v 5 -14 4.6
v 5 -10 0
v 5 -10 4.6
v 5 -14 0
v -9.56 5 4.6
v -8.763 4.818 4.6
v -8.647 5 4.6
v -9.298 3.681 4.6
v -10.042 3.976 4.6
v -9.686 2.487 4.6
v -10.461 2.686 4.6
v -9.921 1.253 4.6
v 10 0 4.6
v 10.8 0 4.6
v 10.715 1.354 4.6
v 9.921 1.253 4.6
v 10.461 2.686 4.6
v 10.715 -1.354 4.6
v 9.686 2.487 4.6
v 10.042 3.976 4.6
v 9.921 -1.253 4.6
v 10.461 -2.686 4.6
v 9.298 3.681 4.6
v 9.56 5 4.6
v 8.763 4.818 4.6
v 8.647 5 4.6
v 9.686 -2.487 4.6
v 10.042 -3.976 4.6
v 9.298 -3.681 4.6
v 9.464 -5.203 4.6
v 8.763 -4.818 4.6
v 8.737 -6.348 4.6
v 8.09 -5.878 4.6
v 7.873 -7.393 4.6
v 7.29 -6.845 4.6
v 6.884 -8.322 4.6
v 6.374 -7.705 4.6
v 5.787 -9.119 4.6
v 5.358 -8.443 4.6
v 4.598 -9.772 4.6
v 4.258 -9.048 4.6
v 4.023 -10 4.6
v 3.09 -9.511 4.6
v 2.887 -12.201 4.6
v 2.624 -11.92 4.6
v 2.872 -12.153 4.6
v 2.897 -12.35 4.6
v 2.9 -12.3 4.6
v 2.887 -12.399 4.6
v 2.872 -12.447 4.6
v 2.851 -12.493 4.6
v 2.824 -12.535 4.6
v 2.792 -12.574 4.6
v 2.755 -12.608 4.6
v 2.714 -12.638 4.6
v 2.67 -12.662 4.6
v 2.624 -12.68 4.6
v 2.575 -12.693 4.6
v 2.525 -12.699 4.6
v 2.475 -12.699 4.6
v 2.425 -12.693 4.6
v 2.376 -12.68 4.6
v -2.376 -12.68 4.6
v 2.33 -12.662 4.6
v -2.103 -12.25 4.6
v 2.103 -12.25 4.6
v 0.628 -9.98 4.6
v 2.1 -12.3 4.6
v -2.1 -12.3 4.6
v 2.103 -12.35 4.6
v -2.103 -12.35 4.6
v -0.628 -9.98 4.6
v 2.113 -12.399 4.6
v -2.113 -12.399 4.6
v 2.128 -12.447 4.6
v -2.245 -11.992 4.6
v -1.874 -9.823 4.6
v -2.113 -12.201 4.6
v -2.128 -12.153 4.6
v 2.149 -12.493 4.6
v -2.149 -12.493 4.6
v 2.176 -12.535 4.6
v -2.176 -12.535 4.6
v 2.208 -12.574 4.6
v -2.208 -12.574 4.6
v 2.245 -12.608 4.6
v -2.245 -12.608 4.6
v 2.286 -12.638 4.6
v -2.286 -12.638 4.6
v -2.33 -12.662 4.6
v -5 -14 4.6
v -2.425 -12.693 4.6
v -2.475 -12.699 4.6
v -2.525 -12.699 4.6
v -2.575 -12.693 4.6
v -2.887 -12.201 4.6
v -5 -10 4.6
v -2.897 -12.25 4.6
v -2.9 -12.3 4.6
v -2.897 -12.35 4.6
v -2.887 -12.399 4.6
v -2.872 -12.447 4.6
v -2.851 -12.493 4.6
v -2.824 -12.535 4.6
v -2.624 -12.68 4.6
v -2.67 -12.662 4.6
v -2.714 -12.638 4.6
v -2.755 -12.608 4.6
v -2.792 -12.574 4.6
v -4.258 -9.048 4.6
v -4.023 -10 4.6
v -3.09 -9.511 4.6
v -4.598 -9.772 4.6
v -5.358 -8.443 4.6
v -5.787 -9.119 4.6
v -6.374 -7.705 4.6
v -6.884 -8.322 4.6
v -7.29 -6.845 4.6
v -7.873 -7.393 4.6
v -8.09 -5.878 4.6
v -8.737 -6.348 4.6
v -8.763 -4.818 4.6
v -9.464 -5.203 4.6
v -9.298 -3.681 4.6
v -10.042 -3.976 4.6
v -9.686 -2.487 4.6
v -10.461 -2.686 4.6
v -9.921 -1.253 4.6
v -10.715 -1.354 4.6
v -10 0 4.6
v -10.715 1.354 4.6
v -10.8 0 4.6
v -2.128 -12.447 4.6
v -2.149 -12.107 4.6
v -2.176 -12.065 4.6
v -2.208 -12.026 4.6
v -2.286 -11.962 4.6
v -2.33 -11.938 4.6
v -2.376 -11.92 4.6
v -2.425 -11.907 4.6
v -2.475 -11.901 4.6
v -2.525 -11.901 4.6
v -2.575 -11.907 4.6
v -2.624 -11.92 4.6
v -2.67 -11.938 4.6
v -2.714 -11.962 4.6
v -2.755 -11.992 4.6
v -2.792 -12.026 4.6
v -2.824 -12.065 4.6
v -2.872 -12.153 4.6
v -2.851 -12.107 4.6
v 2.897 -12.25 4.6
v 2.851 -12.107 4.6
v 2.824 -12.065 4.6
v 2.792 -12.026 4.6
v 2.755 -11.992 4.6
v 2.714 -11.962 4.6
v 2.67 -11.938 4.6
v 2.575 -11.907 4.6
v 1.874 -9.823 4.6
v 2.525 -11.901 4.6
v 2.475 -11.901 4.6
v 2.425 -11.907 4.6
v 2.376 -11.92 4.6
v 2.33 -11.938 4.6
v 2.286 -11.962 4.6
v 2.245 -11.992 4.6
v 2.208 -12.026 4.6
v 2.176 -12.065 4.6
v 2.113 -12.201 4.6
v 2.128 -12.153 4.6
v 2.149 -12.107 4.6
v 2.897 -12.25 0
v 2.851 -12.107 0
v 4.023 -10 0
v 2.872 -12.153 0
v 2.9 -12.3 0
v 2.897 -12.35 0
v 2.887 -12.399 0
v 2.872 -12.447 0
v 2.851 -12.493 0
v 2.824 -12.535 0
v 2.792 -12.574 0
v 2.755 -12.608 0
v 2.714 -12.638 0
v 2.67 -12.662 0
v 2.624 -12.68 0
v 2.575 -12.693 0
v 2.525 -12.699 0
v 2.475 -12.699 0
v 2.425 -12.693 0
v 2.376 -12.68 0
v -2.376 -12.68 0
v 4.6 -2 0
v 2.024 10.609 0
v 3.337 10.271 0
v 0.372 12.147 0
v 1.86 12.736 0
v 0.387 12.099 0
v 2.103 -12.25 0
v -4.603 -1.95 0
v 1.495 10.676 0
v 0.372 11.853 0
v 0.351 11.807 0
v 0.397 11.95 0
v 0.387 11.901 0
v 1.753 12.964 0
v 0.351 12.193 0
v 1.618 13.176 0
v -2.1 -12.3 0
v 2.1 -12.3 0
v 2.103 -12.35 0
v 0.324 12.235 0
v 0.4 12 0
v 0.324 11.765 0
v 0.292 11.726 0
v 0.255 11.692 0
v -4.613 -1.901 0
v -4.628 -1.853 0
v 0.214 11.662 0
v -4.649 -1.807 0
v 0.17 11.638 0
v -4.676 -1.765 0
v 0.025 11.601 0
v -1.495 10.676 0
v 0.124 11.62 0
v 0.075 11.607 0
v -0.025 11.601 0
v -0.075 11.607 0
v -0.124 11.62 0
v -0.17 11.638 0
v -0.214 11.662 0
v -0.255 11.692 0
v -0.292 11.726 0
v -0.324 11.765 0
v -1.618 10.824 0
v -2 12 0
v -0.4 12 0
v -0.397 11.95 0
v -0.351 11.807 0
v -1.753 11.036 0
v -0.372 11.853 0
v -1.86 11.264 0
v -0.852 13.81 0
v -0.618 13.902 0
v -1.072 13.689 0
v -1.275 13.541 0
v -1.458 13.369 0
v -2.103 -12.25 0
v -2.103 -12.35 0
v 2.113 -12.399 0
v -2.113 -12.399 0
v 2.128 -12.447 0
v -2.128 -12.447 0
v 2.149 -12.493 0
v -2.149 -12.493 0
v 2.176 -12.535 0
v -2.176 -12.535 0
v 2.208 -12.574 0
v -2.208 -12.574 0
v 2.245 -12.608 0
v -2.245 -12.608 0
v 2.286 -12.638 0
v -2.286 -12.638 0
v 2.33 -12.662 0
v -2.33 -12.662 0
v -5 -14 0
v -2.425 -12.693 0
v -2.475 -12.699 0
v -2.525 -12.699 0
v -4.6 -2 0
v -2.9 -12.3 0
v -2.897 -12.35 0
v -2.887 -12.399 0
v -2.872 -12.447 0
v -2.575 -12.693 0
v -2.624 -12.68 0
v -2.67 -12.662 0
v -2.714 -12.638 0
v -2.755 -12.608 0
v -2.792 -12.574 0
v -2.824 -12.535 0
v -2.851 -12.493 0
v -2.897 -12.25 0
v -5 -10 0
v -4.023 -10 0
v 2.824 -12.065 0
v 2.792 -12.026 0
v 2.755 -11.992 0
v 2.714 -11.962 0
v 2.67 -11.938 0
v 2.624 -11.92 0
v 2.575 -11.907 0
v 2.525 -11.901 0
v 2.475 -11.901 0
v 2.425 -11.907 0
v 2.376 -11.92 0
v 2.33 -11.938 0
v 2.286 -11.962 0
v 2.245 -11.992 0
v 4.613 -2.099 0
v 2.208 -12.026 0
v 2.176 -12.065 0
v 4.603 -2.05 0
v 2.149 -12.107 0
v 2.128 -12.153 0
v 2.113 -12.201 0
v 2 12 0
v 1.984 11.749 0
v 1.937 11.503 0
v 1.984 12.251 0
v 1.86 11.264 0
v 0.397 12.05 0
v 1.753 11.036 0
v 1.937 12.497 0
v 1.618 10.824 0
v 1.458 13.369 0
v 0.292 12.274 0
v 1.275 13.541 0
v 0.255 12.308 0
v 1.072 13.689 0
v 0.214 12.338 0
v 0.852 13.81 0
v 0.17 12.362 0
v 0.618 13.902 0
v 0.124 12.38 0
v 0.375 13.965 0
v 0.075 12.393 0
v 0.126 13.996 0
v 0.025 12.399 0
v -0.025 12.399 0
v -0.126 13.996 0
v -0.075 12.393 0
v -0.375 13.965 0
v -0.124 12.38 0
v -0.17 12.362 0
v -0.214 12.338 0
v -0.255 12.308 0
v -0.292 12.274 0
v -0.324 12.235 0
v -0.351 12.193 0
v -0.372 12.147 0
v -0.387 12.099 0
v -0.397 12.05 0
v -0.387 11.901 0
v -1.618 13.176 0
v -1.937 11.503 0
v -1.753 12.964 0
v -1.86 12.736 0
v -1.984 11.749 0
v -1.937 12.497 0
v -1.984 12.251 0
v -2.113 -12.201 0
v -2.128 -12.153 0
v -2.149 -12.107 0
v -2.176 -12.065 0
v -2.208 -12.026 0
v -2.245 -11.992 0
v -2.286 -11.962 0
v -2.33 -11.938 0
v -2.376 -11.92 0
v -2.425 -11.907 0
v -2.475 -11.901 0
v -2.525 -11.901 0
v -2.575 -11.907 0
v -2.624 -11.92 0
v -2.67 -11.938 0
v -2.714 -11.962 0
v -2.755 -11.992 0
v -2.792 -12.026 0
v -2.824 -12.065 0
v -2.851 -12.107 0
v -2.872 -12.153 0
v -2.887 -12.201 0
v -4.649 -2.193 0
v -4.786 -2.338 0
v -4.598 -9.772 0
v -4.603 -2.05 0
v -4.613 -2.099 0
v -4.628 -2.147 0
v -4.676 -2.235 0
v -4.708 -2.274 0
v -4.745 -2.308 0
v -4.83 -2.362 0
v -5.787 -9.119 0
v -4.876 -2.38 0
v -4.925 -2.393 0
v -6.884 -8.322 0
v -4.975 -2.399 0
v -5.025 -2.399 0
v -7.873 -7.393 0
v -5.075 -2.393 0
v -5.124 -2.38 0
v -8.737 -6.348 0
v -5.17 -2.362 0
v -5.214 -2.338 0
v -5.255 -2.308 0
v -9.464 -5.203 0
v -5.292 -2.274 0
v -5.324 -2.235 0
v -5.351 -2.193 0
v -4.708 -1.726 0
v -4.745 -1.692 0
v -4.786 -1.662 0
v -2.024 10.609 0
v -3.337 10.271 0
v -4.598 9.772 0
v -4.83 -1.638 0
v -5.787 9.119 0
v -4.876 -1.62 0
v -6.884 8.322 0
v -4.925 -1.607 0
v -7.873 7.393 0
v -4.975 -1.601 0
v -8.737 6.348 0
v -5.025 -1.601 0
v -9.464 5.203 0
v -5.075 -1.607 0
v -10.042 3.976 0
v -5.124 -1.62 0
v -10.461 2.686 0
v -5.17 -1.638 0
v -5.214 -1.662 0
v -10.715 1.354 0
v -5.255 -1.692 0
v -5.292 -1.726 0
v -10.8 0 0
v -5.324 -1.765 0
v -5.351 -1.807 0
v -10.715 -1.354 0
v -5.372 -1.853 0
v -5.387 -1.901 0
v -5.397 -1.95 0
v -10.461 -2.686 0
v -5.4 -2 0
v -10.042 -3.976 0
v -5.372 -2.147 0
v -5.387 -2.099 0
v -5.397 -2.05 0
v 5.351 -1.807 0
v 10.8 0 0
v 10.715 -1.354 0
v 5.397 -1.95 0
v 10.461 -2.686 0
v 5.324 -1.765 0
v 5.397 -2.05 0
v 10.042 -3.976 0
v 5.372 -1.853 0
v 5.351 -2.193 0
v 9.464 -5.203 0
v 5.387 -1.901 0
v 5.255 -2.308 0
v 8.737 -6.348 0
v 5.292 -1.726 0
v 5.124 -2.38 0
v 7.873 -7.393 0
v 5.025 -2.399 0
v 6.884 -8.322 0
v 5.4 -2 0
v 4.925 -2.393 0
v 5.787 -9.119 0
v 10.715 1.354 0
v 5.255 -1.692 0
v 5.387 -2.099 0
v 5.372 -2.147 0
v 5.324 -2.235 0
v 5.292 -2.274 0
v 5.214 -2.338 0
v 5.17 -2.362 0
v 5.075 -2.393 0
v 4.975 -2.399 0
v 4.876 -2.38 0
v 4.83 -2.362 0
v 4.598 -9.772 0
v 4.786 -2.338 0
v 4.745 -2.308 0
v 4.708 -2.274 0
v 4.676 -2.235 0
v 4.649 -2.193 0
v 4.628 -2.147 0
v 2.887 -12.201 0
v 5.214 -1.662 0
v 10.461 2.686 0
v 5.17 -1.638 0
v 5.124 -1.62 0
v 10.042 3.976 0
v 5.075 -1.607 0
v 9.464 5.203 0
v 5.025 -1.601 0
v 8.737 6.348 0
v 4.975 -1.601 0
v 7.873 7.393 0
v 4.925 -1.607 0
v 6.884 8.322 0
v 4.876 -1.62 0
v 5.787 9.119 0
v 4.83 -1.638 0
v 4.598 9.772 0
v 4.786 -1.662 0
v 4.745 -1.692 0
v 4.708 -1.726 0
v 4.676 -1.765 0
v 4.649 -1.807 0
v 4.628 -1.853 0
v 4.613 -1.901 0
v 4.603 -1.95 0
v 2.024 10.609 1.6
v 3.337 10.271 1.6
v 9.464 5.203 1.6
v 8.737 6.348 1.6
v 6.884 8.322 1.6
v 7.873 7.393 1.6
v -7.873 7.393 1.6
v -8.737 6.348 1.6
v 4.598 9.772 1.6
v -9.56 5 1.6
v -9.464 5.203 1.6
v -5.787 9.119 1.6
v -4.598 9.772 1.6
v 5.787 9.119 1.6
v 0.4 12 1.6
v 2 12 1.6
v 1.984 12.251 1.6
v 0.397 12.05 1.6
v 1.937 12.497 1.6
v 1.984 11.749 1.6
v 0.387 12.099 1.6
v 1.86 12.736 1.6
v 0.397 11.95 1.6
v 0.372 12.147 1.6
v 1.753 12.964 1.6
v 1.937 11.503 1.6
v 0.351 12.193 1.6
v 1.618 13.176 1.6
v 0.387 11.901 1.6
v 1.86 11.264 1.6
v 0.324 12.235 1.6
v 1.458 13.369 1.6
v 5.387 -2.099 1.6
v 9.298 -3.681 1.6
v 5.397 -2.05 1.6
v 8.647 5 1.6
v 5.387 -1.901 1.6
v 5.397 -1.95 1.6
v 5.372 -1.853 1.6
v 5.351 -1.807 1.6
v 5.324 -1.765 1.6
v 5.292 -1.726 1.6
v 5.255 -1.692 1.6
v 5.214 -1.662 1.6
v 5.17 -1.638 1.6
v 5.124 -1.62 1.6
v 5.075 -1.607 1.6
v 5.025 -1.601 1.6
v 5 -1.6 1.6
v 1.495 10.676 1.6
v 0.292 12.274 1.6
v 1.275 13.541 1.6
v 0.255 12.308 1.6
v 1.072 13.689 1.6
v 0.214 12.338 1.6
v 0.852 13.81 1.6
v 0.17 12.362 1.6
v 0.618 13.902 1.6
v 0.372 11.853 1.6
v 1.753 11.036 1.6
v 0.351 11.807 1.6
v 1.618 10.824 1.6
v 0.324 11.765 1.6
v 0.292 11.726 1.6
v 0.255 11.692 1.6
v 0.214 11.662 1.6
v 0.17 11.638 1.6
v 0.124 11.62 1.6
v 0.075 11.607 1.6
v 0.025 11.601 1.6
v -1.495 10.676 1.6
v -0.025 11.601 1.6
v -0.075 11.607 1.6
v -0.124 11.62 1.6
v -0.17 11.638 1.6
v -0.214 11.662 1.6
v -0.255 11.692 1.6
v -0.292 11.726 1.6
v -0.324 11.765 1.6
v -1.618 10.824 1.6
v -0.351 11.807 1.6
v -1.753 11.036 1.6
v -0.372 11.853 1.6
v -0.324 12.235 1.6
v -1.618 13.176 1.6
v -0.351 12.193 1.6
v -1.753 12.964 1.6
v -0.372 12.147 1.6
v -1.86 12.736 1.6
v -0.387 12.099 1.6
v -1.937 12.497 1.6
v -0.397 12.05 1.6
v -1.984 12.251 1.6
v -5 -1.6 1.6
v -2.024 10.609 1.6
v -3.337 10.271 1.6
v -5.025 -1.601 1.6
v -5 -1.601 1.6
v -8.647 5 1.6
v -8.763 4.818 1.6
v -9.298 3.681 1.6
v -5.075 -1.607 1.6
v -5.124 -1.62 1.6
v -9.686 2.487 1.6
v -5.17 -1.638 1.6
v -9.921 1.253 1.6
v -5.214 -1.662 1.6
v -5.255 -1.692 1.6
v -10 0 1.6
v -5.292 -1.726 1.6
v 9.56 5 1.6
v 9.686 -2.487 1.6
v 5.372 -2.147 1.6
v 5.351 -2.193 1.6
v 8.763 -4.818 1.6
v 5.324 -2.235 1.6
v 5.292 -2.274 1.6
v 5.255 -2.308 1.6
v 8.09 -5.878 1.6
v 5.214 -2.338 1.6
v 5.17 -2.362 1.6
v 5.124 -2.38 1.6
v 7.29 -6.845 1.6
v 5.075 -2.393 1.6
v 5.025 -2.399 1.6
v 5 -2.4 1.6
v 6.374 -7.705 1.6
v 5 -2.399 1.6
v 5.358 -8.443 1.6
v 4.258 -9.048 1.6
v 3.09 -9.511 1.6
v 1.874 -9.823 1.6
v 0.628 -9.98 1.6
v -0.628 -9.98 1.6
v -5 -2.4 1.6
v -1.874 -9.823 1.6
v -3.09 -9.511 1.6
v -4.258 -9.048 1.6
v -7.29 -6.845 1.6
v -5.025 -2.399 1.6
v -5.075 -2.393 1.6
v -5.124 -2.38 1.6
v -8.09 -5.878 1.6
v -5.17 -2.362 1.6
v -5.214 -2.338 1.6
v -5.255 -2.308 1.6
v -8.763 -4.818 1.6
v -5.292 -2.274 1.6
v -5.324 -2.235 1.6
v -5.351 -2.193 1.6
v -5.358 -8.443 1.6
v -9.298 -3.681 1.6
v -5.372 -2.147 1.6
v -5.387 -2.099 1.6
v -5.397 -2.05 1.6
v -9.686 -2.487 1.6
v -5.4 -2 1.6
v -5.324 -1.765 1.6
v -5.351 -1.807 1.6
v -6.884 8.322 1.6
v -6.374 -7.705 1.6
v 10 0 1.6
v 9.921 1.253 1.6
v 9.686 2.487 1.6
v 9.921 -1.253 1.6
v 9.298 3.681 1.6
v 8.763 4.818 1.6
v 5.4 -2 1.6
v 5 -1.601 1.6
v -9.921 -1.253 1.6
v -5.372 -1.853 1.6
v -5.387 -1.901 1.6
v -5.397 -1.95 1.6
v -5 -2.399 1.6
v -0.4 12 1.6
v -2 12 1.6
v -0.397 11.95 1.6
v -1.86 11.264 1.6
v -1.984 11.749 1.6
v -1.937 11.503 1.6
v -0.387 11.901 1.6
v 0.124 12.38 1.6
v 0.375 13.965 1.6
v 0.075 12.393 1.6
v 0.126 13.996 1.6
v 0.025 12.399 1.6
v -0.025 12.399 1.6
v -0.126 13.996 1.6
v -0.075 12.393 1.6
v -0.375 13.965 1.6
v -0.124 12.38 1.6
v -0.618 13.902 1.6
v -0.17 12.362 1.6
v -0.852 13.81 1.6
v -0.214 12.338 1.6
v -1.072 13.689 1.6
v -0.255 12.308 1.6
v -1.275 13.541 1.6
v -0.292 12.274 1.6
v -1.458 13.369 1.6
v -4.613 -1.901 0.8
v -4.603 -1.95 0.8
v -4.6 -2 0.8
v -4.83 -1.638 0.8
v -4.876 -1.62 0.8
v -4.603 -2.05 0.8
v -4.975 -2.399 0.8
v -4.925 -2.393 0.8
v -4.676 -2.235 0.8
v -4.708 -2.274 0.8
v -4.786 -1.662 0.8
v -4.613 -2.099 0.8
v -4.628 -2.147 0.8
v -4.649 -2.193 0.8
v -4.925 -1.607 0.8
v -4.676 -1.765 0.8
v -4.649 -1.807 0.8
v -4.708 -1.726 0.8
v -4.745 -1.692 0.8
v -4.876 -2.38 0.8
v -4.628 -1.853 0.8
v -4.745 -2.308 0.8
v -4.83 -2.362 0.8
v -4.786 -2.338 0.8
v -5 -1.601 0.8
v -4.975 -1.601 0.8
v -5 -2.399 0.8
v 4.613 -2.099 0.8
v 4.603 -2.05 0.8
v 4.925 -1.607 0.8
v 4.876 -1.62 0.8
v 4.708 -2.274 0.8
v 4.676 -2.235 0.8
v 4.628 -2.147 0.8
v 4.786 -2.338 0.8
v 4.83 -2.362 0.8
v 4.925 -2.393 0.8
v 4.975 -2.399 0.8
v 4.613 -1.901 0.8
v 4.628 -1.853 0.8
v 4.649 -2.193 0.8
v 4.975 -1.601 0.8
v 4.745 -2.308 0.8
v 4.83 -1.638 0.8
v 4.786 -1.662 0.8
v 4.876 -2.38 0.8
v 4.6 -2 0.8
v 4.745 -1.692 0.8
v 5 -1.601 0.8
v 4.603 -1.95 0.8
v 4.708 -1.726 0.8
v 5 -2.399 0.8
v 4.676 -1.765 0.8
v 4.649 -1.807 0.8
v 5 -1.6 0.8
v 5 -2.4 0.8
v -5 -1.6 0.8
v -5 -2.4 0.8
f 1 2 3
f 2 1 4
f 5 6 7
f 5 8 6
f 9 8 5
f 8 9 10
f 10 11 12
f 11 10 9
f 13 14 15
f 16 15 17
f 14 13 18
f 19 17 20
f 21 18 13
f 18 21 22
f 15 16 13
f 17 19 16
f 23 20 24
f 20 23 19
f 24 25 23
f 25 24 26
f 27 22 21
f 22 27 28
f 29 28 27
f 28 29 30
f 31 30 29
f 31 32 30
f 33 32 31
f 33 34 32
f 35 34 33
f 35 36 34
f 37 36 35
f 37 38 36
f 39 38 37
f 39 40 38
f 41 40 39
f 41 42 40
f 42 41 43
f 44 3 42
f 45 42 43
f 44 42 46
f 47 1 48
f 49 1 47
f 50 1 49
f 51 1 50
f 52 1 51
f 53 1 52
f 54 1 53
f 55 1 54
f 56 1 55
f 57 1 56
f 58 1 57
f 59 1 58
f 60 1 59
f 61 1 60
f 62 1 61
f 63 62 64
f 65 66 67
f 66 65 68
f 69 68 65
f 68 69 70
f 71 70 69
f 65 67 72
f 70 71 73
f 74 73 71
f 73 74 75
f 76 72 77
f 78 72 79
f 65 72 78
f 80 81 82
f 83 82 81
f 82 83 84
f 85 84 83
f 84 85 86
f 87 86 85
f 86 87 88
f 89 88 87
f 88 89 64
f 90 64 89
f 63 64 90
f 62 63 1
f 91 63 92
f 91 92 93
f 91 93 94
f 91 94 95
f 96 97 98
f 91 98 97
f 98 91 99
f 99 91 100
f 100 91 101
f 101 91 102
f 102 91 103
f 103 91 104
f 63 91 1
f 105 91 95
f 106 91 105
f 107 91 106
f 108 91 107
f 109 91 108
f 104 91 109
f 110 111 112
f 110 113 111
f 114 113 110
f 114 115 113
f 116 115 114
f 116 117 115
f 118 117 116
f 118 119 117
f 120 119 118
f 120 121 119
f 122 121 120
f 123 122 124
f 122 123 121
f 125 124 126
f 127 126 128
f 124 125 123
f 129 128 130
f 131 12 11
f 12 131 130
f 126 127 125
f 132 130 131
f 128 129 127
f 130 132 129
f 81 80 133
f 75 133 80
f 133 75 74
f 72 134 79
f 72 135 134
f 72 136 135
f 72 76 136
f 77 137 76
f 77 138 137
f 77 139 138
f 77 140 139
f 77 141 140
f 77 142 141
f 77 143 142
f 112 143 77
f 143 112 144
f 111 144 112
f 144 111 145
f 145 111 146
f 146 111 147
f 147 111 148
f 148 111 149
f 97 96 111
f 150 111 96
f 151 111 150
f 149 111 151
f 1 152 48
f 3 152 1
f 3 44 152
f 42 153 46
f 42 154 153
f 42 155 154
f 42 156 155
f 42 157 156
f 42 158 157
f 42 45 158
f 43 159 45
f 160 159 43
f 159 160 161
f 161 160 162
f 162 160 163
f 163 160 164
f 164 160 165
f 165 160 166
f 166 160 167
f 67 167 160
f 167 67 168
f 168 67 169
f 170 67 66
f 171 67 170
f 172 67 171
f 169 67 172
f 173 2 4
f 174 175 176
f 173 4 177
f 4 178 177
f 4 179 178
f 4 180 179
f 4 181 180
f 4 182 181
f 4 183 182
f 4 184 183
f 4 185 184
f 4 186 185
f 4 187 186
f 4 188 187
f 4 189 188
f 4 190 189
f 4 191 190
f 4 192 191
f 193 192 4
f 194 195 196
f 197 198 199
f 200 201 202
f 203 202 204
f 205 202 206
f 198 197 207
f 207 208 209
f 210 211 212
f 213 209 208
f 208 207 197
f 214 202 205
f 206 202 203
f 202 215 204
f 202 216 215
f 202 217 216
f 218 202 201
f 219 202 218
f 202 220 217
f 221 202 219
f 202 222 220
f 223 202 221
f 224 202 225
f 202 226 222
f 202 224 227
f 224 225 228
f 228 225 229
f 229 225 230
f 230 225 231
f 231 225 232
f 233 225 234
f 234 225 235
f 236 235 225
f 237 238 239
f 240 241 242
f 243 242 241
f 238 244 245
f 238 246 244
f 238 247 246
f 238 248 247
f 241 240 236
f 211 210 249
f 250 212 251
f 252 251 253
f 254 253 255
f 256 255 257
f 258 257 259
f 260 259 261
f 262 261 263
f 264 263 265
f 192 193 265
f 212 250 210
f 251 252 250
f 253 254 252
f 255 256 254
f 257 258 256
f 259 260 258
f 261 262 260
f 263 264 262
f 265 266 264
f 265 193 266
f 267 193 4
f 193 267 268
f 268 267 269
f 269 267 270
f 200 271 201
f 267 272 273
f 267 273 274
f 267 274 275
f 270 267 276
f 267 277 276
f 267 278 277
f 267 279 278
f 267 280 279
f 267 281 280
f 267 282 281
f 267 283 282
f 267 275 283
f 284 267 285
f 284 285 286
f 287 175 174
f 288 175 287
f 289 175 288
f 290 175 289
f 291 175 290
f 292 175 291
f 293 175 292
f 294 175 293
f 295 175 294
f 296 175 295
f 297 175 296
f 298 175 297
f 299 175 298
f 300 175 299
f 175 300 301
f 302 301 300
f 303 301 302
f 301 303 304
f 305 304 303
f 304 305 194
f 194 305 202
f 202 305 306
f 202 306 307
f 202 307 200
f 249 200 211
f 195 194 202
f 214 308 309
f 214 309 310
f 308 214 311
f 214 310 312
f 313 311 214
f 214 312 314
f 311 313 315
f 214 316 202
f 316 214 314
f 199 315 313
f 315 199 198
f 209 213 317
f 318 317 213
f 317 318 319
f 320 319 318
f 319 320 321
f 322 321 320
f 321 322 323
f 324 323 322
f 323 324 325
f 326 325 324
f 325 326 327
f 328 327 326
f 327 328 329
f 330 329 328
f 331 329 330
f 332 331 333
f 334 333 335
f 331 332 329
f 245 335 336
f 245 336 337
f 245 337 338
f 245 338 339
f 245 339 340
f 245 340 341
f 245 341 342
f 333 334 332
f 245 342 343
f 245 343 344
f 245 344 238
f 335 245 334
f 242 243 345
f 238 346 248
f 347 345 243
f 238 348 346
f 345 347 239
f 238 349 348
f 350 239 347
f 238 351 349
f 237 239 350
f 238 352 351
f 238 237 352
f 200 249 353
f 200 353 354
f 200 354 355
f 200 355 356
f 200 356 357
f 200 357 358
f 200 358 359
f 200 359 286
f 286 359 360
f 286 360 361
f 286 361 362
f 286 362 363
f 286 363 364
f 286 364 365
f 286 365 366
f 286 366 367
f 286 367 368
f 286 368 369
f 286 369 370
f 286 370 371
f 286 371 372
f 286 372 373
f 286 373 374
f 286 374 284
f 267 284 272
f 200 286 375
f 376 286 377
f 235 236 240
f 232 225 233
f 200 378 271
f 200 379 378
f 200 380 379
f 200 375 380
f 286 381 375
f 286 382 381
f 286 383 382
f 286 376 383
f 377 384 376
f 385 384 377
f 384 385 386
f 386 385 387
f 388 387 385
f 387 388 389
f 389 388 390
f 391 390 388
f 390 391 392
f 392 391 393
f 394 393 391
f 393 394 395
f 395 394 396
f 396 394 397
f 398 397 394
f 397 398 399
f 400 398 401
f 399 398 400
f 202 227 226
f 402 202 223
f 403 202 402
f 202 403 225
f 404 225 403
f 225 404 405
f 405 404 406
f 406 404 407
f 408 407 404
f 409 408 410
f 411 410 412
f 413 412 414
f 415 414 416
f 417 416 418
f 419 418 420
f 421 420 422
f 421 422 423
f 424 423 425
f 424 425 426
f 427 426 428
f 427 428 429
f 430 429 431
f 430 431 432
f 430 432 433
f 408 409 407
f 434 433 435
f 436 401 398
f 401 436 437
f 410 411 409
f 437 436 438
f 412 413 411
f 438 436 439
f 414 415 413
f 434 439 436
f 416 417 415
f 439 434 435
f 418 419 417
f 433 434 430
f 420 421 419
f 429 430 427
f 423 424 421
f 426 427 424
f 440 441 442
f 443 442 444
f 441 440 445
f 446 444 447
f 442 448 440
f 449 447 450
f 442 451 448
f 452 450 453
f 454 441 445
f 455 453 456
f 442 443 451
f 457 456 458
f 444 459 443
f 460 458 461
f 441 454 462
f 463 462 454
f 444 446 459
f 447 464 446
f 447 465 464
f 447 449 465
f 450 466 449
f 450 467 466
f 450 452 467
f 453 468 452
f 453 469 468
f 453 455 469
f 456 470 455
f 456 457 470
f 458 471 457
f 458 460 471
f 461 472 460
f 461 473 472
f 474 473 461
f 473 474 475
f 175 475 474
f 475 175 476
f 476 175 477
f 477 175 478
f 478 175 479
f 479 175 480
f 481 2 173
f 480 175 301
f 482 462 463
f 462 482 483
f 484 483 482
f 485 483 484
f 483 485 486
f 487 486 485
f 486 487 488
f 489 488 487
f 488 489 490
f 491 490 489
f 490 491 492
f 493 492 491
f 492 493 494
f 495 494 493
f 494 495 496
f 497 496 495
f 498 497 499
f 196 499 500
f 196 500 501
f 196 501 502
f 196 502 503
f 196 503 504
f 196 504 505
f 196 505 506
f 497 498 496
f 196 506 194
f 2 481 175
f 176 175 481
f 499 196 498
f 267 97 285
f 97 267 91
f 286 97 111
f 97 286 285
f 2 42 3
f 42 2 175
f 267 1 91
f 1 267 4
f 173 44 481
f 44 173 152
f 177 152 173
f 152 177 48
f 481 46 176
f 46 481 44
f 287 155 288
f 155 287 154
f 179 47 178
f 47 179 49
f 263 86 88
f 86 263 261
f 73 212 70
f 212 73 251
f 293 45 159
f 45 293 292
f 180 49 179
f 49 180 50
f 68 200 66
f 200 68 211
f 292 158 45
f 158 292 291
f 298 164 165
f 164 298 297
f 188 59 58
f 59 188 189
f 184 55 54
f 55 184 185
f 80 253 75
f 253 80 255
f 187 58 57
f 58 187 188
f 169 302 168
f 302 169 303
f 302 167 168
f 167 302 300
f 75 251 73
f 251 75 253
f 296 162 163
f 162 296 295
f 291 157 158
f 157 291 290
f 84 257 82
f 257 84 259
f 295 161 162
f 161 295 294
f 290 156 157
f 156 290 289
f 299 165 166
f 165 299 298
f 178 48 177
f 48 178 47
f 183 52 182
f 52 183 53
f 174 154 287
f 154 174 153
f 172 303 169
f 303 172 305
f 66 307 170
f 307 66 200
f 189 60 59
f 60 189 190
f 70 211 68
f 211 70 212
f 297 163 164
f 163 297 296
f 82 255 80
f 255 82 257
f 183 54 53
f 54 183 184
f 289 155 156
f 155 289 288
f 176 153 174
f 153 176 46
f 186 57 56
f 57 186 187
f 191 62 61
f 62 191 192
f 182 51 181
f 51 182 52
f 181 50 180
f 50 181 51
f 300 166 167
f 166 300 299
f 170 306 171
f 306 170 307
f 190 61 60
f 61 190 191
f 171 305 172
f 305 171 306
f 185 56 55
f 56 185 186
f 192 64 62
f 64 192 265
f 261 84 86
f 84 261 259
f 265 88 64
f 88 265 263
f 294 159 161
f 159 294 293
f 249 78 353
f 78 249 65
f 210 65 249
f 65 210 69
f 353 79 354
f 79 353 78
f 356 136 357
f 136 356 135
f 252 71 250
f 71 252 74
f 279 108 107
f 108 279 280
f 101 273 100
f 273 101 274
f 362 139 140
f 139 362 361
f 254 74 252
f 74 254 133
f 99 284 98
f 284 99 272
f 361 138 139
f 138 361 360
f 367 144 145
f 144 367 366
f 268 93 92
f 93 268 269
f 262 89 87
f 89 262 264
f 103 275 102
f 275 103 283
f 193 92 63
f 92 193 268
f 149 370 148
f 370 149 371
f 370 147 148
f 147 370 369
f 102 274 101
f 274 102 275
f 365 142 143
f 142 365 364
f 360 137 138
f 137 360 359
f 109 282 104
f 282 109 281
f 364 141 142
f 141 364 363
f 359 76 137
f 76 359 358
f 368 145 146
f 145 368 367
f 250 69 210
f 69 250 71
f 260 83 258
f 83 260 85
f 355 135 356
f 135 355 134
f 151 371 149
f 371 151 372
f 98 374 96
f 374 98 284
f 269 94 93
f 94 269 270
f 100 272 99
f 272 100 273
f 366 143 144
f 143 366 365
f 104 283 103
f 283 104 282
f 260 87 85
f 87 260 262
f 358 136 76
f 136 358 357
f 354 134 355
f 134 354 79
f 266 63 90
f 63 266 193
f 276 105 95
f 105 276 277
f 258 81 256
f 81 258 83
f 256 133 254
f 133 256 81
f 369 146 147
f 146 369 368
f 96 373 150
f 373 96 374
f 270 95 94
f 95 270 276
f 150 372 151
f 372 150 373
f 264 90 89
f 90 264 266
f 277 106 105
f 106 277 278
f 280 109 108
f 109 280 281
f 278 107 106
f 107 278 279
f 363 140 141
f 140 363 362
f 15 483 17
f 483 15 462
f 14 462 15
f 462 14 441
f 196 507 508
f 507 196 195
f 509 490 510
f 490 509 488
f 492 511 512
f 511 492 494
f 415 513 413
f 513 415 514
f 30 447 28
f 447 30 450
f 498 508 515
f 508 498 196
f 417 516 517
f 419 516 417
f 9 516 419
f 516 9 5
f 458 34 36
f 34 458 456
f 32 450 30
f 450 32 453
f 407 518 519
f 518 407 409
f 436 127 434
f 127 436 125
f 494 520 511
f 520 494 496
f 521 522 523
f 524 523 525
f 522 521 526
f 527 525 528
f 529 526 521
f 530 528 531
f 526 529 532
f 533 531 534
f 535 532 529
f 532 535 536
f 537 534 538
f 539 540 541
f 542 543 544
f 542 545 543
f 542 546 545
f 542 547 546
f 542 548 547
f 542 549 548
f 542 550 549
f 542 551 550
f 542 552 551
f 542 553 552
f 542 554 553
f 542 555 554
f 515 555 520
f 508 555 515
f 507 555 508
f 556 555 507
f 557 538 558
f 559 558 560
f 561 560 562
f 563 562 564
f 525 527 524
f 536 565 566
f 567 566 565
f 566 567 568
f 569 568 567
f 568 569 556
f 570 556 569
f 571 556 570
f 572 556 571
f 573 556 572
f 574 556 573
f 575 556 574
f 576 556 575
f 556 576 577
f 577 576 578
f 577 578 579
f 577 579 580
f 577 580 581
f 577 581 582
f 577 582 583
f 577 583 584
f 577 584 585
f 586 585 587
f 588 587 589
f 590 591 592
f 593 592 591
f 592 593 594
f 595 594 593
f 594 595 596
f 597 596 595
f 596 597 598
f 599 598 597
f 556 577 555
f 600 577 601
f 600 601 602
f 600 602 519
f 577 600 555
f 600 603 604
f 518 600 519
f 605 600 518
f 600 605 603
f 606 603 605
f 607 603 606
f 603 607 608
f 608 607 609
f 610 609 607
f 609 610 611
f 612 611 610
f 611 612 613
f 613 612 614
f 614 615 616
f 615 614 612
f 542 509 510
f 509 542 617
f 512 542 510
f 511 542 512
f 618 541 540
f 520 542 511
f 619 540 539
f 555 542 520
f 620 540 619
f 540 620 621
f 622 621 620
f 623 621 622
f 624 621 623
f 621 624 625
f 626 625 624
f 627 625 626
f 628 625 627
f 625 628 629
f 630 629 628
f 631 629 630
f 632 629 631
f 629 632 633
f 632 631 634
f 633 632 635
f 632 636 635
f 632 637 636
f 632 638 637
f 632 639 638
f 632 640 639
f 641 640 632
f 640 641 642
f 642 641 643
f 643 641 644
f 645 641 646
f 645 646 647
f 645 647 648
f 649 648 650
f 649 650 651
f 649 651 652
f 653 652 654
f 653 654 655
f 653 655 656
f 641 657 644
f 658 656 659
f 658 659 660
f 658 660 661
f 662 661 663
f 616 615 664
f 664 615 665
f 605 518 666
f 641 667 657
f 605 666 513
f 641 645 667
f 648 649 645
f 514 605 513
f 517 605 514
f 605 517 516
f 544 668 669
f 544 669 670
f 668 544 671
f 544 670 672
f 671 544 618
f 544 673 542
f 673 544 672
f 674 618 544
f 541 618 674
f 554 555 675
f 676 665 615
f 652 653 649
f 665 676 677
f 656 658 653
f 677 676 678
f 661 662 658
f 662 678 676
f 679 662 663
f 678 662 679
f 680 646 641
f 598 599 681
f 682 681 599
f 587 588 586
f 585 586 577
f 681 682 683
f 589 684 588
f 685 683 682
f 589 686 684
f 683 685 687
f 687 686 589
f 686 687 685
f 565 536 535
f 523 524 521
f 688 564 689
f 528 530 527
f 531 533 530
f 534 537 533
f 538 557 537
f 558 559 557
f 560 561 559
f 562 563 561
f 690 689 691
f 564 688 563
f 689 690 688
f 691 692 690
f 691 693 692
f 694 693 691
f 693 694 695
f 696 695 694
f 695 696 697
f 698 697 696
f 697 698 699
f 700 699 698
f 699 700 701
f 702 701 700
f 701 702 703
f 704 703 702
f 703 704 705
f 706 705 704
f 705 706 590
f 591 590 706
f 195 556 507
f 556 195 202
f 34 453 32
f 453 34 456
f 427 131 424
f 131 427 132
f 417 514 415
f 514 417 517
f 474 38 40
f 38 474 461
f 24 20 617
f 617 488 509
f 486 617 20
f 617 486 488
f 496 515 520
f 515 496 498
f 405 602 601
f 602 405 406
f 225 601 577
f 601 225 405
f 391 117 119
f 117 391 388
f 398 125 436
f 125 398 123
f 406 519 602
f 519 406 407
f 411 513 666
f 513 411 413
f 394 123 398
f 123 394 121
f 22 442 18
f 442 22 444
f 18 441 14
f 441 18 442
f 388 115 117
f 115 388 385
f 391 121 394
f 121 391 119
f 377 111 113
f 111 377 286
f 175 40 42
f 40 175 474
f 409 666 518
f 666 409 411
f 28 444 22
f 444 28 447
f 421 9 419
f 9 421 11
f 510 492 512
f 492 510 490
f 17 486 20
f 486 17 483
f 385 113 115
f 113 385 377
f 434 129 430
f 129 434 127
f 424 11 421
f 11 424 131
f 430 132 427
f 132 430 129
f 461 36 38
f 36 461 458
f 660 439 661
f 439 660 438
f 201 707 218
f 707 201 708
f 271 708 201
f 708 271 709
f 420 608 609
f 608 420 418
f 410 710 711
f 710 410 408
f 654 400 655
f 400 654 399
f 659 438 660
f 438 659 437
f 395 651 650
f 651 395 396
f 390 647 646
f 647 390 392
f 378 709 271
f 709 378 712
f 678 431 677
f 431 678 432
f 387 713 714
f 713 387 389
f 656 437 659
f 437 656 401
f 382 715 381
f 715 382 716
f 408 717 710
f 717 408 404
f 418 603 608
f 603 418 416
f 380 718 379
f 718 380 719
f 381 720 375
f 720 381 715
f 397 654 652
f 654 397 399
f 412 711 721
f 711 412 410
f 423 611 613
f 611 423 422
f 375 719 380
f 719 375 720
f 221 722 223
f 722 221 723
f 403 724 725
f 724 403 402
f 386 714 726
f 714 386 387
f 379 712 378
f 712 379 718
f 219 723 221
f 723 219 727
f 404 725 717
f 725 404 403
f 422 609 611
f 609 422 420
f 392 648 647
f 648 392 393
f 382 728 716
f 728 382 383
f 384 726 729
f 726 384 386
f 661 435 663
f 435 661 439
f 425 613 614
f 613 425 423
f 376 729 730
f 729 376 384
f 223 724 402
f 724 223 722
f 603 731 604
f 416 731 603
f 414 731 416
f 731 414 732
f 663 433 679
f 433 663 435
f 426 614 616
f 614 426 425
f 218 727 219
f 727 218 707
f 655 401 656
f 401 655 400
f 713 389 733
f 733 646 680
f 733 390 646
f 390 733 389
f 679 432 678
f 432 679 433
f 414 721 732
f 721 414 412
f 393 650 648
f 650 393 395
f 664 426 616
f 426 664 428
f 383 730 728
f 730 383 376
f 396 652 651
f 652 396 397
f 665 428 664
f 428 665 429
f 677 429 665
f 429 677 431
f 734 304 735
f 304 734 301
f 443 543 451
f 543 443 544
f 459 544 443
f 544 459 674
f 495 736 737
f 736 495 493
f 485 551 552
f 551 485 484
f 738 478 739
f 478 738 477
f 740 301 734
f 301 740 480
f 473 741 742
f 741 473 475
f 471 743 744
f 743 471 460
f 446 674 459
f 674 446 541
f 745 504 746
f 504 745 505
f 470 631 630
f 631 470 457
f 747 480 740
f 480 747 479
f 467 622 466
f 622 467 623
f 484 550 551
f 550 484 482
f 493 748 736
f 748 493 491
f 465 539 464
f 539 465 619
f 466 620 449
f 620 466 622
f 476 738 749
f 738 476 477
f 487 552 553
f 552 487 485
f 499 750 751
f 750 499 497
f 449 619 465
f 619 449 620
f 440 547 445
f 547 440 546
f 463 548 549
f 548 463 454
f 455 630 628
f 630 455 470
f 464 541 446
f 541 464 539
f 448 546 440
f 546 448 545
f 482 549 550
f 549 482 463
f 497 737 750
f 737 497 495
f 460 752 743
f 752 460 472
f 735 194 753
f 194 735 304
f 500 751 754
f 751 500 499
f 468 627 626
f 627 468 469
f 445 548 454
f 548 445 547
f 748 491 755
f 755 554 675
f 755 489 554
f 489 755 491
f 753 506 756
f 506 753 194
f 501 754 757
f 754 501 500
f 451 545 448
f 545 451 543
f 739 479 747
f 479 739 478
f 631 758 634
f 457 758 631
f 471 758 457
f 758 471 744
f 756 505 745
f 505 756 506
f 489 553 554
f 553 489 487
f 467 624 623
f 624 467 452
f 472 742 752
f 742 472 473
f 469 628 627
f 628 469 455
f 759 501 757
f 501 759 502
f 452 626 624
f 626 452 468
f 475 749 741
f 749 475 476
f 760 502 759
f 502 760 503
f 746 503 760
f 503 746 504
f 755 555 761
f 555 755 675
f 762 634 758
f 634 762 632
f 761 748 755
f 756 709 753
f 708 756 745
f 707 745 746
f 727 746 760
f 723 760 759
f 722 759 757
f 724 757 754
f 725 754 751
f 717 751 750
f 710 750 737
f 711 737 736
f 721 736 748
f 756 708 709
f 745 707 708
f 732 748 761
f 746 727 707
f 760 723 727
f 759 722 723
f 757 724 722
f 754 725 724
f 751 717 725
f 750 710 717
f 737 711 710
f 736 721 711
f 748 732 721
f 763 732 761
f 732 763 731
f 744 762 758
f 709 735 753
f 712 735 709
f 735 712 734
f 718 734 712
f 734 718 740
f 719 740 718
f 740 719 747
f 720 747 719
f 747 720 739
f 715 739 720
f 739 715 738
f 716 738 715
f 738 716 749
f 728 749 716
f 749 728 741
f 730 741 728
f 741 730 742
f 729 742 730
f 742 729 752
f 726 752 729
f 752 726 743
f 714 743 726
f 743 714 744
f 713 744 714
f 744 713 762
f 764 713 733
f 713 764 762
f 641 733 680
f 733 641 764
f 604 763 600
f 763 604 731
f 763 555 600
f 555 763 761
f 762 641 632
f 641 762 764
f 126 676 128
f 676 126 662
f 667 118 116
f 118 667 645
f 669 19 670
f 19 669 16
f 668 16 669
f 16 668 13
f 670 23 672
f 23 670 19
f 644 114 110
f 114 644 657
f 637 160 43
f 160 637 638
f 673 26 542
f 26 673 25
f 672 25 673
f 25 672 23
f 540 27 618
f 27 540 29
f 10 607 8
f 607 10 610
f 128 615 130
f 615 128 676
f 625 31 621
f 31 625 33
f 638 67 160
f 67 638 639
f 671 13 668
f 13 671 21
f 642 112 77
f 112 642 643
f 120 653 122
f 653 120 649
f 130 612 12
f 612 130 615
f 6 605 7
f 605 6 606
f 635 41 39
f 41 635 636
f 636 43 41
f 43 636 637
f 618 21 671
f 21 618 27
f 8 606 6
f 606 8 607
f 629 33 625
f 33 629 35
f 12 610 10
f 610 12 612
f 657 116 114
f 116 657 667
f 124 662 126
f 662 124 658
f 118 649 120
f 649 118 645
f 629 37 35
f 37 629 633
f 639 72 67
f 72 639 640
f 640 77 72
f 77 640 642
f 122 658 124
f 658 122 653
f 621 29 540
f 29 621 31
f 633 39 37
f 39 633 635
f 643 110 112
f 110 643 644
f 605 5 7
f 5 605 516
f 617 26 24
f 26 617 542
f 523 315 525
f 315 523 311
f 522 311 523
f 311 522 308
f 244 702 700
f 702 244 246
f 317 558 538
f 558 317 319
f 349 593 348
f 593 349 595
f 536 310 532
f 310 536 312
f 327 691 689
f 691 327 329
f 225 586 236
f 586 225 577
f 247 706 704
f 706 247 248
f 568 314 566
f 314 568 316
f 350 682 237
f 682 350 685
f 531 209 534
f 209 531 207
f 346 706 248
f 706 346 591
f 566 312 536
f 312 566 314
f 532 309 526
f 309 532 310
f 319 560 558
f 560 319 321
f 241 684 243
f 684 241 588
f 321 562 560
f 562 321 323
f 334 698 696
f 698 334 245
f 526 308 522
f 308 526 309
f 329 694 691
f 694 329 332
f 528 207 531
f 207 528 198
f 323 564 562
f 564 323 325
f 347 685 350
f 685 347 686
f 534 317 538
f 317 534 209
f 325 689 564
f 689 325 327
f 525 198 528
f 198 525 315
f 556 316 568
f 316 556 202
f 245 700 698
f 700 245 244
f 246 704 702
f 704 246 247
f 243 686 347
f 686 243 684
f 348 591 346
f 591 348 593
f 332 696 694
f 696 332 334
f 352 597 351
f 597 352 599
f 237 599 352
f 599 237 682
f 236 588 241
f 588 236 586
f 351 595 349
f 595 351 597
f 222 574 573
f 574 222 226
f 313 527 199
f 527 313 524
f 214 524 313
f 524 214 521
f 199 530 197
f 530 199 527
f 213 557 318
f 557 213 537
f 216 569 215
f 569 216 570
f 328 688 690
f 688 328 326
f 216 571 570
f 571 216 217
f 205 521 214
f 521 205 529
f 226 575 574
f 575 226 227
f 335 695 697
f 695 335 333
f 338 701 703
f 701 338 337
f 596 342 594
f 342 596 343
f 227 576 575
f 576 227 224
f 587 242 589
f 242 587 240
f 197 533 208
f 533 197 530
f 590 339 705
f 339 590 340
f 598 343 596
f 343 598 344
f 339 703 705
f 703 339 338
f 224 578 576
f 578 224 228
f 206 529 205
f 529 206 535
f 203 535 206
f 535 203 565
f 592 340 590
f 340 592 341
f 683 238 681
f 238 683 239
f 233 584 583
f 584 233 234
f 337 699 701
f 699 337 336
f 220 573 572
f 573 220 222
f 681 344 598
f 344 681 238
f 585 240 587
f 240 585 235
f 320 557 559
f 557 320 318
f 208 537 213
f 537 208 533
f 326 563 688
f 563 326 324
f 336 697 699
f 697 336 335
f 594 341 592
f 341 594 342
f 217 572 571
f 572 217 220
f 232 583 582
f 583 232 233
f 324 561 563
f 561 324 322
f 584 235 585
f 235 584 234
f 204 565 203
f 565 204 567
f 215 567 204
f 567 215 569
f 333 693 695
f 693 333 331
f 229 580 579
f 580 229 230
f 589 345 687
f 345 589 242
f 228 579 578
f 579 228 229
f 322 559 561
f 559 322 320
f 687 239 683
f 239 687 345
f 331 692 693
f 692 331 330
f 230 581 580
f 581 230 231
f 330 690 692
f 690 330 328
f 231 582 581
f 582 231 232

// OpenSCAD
// Licence: Creative Commons, Attribution
// Parametrized button battery clip holder

// Thingiverse user by bmcage
// Same idea as http://www.thingiverse.com/thing:48606 but 
// parametric


//what button battery should this hold
battery = "CR2032";  //[CR2032, AG13, custom]
//if custom battery, what is radius ?
custom_radius = 10; // [5:30]
//if custom battery, what is width ?
custom_width = 3; // [1:10]
//width of edges, hint: take 2*nozzle diameter of your printer
edge = 0.8;

module divider(radius,width) {
  difference() {
    cylinder(r=radius+edge, h=edge+0.8,$fn=50);
    translate([-radius/2,-2,0]) cylinder(r=0.4, h=edge+10,center=true,$fn=50);
    translate([radius/2,-2,0]) cylinder(r=0.4, h=edge+10,center=true,$fn=50);
    translate([-radius/2, -2-0.8/2,edge]) cube([radius,0.8,2*0.8]);
    }  
  difference() {
    cylinder(r=radius+edge, h=edge+0.8+width,$fn=50);
    cylinder(r=radius, h=4*(edge+0.8+width),$fn=50, center=true);
    translate([0,2*radius+radius/2,width+edge+0.8]) cube([4*radius, 4*radius,2*width], center = true);
    }
  
}

module holder(radius, width) {
  union() {
    difference() {
      translate([-radius/2,-radius-4,0]) cube([radius, 4, width+edge+0.8]);
      translate([radius/4, -radius-edge-1.5,0])cylinder(r=0.4, h=2*(width+edge+10),center=true,$fn=50);
      translate([-radius/4, -radius-edge-1.5,0])cylinder(r=0.4, h=2*(width+edge+10),center=true,$fn=50);
      }
    divider(radius,width);
    //now a ring to hang it to something
    difference() {
      translate([0,radius+0.4+2*edge,0]) cylinder(r=0.4+2*edge, h=edge+0.8,$fn=50);
      translate([0,radius+0.4+2*edge,-0.8]) cylinder(r=0.4, h=2*(edge+0.8),$fn=50);
    }
  }
}


if (battery == "CR2032") {
    holder(10, 3);
}
if (battery == "AG13") {
    holder(6, 6.3);
}
if (battery == "custom") {
    holder(custom_radius,custom_width);
} 
